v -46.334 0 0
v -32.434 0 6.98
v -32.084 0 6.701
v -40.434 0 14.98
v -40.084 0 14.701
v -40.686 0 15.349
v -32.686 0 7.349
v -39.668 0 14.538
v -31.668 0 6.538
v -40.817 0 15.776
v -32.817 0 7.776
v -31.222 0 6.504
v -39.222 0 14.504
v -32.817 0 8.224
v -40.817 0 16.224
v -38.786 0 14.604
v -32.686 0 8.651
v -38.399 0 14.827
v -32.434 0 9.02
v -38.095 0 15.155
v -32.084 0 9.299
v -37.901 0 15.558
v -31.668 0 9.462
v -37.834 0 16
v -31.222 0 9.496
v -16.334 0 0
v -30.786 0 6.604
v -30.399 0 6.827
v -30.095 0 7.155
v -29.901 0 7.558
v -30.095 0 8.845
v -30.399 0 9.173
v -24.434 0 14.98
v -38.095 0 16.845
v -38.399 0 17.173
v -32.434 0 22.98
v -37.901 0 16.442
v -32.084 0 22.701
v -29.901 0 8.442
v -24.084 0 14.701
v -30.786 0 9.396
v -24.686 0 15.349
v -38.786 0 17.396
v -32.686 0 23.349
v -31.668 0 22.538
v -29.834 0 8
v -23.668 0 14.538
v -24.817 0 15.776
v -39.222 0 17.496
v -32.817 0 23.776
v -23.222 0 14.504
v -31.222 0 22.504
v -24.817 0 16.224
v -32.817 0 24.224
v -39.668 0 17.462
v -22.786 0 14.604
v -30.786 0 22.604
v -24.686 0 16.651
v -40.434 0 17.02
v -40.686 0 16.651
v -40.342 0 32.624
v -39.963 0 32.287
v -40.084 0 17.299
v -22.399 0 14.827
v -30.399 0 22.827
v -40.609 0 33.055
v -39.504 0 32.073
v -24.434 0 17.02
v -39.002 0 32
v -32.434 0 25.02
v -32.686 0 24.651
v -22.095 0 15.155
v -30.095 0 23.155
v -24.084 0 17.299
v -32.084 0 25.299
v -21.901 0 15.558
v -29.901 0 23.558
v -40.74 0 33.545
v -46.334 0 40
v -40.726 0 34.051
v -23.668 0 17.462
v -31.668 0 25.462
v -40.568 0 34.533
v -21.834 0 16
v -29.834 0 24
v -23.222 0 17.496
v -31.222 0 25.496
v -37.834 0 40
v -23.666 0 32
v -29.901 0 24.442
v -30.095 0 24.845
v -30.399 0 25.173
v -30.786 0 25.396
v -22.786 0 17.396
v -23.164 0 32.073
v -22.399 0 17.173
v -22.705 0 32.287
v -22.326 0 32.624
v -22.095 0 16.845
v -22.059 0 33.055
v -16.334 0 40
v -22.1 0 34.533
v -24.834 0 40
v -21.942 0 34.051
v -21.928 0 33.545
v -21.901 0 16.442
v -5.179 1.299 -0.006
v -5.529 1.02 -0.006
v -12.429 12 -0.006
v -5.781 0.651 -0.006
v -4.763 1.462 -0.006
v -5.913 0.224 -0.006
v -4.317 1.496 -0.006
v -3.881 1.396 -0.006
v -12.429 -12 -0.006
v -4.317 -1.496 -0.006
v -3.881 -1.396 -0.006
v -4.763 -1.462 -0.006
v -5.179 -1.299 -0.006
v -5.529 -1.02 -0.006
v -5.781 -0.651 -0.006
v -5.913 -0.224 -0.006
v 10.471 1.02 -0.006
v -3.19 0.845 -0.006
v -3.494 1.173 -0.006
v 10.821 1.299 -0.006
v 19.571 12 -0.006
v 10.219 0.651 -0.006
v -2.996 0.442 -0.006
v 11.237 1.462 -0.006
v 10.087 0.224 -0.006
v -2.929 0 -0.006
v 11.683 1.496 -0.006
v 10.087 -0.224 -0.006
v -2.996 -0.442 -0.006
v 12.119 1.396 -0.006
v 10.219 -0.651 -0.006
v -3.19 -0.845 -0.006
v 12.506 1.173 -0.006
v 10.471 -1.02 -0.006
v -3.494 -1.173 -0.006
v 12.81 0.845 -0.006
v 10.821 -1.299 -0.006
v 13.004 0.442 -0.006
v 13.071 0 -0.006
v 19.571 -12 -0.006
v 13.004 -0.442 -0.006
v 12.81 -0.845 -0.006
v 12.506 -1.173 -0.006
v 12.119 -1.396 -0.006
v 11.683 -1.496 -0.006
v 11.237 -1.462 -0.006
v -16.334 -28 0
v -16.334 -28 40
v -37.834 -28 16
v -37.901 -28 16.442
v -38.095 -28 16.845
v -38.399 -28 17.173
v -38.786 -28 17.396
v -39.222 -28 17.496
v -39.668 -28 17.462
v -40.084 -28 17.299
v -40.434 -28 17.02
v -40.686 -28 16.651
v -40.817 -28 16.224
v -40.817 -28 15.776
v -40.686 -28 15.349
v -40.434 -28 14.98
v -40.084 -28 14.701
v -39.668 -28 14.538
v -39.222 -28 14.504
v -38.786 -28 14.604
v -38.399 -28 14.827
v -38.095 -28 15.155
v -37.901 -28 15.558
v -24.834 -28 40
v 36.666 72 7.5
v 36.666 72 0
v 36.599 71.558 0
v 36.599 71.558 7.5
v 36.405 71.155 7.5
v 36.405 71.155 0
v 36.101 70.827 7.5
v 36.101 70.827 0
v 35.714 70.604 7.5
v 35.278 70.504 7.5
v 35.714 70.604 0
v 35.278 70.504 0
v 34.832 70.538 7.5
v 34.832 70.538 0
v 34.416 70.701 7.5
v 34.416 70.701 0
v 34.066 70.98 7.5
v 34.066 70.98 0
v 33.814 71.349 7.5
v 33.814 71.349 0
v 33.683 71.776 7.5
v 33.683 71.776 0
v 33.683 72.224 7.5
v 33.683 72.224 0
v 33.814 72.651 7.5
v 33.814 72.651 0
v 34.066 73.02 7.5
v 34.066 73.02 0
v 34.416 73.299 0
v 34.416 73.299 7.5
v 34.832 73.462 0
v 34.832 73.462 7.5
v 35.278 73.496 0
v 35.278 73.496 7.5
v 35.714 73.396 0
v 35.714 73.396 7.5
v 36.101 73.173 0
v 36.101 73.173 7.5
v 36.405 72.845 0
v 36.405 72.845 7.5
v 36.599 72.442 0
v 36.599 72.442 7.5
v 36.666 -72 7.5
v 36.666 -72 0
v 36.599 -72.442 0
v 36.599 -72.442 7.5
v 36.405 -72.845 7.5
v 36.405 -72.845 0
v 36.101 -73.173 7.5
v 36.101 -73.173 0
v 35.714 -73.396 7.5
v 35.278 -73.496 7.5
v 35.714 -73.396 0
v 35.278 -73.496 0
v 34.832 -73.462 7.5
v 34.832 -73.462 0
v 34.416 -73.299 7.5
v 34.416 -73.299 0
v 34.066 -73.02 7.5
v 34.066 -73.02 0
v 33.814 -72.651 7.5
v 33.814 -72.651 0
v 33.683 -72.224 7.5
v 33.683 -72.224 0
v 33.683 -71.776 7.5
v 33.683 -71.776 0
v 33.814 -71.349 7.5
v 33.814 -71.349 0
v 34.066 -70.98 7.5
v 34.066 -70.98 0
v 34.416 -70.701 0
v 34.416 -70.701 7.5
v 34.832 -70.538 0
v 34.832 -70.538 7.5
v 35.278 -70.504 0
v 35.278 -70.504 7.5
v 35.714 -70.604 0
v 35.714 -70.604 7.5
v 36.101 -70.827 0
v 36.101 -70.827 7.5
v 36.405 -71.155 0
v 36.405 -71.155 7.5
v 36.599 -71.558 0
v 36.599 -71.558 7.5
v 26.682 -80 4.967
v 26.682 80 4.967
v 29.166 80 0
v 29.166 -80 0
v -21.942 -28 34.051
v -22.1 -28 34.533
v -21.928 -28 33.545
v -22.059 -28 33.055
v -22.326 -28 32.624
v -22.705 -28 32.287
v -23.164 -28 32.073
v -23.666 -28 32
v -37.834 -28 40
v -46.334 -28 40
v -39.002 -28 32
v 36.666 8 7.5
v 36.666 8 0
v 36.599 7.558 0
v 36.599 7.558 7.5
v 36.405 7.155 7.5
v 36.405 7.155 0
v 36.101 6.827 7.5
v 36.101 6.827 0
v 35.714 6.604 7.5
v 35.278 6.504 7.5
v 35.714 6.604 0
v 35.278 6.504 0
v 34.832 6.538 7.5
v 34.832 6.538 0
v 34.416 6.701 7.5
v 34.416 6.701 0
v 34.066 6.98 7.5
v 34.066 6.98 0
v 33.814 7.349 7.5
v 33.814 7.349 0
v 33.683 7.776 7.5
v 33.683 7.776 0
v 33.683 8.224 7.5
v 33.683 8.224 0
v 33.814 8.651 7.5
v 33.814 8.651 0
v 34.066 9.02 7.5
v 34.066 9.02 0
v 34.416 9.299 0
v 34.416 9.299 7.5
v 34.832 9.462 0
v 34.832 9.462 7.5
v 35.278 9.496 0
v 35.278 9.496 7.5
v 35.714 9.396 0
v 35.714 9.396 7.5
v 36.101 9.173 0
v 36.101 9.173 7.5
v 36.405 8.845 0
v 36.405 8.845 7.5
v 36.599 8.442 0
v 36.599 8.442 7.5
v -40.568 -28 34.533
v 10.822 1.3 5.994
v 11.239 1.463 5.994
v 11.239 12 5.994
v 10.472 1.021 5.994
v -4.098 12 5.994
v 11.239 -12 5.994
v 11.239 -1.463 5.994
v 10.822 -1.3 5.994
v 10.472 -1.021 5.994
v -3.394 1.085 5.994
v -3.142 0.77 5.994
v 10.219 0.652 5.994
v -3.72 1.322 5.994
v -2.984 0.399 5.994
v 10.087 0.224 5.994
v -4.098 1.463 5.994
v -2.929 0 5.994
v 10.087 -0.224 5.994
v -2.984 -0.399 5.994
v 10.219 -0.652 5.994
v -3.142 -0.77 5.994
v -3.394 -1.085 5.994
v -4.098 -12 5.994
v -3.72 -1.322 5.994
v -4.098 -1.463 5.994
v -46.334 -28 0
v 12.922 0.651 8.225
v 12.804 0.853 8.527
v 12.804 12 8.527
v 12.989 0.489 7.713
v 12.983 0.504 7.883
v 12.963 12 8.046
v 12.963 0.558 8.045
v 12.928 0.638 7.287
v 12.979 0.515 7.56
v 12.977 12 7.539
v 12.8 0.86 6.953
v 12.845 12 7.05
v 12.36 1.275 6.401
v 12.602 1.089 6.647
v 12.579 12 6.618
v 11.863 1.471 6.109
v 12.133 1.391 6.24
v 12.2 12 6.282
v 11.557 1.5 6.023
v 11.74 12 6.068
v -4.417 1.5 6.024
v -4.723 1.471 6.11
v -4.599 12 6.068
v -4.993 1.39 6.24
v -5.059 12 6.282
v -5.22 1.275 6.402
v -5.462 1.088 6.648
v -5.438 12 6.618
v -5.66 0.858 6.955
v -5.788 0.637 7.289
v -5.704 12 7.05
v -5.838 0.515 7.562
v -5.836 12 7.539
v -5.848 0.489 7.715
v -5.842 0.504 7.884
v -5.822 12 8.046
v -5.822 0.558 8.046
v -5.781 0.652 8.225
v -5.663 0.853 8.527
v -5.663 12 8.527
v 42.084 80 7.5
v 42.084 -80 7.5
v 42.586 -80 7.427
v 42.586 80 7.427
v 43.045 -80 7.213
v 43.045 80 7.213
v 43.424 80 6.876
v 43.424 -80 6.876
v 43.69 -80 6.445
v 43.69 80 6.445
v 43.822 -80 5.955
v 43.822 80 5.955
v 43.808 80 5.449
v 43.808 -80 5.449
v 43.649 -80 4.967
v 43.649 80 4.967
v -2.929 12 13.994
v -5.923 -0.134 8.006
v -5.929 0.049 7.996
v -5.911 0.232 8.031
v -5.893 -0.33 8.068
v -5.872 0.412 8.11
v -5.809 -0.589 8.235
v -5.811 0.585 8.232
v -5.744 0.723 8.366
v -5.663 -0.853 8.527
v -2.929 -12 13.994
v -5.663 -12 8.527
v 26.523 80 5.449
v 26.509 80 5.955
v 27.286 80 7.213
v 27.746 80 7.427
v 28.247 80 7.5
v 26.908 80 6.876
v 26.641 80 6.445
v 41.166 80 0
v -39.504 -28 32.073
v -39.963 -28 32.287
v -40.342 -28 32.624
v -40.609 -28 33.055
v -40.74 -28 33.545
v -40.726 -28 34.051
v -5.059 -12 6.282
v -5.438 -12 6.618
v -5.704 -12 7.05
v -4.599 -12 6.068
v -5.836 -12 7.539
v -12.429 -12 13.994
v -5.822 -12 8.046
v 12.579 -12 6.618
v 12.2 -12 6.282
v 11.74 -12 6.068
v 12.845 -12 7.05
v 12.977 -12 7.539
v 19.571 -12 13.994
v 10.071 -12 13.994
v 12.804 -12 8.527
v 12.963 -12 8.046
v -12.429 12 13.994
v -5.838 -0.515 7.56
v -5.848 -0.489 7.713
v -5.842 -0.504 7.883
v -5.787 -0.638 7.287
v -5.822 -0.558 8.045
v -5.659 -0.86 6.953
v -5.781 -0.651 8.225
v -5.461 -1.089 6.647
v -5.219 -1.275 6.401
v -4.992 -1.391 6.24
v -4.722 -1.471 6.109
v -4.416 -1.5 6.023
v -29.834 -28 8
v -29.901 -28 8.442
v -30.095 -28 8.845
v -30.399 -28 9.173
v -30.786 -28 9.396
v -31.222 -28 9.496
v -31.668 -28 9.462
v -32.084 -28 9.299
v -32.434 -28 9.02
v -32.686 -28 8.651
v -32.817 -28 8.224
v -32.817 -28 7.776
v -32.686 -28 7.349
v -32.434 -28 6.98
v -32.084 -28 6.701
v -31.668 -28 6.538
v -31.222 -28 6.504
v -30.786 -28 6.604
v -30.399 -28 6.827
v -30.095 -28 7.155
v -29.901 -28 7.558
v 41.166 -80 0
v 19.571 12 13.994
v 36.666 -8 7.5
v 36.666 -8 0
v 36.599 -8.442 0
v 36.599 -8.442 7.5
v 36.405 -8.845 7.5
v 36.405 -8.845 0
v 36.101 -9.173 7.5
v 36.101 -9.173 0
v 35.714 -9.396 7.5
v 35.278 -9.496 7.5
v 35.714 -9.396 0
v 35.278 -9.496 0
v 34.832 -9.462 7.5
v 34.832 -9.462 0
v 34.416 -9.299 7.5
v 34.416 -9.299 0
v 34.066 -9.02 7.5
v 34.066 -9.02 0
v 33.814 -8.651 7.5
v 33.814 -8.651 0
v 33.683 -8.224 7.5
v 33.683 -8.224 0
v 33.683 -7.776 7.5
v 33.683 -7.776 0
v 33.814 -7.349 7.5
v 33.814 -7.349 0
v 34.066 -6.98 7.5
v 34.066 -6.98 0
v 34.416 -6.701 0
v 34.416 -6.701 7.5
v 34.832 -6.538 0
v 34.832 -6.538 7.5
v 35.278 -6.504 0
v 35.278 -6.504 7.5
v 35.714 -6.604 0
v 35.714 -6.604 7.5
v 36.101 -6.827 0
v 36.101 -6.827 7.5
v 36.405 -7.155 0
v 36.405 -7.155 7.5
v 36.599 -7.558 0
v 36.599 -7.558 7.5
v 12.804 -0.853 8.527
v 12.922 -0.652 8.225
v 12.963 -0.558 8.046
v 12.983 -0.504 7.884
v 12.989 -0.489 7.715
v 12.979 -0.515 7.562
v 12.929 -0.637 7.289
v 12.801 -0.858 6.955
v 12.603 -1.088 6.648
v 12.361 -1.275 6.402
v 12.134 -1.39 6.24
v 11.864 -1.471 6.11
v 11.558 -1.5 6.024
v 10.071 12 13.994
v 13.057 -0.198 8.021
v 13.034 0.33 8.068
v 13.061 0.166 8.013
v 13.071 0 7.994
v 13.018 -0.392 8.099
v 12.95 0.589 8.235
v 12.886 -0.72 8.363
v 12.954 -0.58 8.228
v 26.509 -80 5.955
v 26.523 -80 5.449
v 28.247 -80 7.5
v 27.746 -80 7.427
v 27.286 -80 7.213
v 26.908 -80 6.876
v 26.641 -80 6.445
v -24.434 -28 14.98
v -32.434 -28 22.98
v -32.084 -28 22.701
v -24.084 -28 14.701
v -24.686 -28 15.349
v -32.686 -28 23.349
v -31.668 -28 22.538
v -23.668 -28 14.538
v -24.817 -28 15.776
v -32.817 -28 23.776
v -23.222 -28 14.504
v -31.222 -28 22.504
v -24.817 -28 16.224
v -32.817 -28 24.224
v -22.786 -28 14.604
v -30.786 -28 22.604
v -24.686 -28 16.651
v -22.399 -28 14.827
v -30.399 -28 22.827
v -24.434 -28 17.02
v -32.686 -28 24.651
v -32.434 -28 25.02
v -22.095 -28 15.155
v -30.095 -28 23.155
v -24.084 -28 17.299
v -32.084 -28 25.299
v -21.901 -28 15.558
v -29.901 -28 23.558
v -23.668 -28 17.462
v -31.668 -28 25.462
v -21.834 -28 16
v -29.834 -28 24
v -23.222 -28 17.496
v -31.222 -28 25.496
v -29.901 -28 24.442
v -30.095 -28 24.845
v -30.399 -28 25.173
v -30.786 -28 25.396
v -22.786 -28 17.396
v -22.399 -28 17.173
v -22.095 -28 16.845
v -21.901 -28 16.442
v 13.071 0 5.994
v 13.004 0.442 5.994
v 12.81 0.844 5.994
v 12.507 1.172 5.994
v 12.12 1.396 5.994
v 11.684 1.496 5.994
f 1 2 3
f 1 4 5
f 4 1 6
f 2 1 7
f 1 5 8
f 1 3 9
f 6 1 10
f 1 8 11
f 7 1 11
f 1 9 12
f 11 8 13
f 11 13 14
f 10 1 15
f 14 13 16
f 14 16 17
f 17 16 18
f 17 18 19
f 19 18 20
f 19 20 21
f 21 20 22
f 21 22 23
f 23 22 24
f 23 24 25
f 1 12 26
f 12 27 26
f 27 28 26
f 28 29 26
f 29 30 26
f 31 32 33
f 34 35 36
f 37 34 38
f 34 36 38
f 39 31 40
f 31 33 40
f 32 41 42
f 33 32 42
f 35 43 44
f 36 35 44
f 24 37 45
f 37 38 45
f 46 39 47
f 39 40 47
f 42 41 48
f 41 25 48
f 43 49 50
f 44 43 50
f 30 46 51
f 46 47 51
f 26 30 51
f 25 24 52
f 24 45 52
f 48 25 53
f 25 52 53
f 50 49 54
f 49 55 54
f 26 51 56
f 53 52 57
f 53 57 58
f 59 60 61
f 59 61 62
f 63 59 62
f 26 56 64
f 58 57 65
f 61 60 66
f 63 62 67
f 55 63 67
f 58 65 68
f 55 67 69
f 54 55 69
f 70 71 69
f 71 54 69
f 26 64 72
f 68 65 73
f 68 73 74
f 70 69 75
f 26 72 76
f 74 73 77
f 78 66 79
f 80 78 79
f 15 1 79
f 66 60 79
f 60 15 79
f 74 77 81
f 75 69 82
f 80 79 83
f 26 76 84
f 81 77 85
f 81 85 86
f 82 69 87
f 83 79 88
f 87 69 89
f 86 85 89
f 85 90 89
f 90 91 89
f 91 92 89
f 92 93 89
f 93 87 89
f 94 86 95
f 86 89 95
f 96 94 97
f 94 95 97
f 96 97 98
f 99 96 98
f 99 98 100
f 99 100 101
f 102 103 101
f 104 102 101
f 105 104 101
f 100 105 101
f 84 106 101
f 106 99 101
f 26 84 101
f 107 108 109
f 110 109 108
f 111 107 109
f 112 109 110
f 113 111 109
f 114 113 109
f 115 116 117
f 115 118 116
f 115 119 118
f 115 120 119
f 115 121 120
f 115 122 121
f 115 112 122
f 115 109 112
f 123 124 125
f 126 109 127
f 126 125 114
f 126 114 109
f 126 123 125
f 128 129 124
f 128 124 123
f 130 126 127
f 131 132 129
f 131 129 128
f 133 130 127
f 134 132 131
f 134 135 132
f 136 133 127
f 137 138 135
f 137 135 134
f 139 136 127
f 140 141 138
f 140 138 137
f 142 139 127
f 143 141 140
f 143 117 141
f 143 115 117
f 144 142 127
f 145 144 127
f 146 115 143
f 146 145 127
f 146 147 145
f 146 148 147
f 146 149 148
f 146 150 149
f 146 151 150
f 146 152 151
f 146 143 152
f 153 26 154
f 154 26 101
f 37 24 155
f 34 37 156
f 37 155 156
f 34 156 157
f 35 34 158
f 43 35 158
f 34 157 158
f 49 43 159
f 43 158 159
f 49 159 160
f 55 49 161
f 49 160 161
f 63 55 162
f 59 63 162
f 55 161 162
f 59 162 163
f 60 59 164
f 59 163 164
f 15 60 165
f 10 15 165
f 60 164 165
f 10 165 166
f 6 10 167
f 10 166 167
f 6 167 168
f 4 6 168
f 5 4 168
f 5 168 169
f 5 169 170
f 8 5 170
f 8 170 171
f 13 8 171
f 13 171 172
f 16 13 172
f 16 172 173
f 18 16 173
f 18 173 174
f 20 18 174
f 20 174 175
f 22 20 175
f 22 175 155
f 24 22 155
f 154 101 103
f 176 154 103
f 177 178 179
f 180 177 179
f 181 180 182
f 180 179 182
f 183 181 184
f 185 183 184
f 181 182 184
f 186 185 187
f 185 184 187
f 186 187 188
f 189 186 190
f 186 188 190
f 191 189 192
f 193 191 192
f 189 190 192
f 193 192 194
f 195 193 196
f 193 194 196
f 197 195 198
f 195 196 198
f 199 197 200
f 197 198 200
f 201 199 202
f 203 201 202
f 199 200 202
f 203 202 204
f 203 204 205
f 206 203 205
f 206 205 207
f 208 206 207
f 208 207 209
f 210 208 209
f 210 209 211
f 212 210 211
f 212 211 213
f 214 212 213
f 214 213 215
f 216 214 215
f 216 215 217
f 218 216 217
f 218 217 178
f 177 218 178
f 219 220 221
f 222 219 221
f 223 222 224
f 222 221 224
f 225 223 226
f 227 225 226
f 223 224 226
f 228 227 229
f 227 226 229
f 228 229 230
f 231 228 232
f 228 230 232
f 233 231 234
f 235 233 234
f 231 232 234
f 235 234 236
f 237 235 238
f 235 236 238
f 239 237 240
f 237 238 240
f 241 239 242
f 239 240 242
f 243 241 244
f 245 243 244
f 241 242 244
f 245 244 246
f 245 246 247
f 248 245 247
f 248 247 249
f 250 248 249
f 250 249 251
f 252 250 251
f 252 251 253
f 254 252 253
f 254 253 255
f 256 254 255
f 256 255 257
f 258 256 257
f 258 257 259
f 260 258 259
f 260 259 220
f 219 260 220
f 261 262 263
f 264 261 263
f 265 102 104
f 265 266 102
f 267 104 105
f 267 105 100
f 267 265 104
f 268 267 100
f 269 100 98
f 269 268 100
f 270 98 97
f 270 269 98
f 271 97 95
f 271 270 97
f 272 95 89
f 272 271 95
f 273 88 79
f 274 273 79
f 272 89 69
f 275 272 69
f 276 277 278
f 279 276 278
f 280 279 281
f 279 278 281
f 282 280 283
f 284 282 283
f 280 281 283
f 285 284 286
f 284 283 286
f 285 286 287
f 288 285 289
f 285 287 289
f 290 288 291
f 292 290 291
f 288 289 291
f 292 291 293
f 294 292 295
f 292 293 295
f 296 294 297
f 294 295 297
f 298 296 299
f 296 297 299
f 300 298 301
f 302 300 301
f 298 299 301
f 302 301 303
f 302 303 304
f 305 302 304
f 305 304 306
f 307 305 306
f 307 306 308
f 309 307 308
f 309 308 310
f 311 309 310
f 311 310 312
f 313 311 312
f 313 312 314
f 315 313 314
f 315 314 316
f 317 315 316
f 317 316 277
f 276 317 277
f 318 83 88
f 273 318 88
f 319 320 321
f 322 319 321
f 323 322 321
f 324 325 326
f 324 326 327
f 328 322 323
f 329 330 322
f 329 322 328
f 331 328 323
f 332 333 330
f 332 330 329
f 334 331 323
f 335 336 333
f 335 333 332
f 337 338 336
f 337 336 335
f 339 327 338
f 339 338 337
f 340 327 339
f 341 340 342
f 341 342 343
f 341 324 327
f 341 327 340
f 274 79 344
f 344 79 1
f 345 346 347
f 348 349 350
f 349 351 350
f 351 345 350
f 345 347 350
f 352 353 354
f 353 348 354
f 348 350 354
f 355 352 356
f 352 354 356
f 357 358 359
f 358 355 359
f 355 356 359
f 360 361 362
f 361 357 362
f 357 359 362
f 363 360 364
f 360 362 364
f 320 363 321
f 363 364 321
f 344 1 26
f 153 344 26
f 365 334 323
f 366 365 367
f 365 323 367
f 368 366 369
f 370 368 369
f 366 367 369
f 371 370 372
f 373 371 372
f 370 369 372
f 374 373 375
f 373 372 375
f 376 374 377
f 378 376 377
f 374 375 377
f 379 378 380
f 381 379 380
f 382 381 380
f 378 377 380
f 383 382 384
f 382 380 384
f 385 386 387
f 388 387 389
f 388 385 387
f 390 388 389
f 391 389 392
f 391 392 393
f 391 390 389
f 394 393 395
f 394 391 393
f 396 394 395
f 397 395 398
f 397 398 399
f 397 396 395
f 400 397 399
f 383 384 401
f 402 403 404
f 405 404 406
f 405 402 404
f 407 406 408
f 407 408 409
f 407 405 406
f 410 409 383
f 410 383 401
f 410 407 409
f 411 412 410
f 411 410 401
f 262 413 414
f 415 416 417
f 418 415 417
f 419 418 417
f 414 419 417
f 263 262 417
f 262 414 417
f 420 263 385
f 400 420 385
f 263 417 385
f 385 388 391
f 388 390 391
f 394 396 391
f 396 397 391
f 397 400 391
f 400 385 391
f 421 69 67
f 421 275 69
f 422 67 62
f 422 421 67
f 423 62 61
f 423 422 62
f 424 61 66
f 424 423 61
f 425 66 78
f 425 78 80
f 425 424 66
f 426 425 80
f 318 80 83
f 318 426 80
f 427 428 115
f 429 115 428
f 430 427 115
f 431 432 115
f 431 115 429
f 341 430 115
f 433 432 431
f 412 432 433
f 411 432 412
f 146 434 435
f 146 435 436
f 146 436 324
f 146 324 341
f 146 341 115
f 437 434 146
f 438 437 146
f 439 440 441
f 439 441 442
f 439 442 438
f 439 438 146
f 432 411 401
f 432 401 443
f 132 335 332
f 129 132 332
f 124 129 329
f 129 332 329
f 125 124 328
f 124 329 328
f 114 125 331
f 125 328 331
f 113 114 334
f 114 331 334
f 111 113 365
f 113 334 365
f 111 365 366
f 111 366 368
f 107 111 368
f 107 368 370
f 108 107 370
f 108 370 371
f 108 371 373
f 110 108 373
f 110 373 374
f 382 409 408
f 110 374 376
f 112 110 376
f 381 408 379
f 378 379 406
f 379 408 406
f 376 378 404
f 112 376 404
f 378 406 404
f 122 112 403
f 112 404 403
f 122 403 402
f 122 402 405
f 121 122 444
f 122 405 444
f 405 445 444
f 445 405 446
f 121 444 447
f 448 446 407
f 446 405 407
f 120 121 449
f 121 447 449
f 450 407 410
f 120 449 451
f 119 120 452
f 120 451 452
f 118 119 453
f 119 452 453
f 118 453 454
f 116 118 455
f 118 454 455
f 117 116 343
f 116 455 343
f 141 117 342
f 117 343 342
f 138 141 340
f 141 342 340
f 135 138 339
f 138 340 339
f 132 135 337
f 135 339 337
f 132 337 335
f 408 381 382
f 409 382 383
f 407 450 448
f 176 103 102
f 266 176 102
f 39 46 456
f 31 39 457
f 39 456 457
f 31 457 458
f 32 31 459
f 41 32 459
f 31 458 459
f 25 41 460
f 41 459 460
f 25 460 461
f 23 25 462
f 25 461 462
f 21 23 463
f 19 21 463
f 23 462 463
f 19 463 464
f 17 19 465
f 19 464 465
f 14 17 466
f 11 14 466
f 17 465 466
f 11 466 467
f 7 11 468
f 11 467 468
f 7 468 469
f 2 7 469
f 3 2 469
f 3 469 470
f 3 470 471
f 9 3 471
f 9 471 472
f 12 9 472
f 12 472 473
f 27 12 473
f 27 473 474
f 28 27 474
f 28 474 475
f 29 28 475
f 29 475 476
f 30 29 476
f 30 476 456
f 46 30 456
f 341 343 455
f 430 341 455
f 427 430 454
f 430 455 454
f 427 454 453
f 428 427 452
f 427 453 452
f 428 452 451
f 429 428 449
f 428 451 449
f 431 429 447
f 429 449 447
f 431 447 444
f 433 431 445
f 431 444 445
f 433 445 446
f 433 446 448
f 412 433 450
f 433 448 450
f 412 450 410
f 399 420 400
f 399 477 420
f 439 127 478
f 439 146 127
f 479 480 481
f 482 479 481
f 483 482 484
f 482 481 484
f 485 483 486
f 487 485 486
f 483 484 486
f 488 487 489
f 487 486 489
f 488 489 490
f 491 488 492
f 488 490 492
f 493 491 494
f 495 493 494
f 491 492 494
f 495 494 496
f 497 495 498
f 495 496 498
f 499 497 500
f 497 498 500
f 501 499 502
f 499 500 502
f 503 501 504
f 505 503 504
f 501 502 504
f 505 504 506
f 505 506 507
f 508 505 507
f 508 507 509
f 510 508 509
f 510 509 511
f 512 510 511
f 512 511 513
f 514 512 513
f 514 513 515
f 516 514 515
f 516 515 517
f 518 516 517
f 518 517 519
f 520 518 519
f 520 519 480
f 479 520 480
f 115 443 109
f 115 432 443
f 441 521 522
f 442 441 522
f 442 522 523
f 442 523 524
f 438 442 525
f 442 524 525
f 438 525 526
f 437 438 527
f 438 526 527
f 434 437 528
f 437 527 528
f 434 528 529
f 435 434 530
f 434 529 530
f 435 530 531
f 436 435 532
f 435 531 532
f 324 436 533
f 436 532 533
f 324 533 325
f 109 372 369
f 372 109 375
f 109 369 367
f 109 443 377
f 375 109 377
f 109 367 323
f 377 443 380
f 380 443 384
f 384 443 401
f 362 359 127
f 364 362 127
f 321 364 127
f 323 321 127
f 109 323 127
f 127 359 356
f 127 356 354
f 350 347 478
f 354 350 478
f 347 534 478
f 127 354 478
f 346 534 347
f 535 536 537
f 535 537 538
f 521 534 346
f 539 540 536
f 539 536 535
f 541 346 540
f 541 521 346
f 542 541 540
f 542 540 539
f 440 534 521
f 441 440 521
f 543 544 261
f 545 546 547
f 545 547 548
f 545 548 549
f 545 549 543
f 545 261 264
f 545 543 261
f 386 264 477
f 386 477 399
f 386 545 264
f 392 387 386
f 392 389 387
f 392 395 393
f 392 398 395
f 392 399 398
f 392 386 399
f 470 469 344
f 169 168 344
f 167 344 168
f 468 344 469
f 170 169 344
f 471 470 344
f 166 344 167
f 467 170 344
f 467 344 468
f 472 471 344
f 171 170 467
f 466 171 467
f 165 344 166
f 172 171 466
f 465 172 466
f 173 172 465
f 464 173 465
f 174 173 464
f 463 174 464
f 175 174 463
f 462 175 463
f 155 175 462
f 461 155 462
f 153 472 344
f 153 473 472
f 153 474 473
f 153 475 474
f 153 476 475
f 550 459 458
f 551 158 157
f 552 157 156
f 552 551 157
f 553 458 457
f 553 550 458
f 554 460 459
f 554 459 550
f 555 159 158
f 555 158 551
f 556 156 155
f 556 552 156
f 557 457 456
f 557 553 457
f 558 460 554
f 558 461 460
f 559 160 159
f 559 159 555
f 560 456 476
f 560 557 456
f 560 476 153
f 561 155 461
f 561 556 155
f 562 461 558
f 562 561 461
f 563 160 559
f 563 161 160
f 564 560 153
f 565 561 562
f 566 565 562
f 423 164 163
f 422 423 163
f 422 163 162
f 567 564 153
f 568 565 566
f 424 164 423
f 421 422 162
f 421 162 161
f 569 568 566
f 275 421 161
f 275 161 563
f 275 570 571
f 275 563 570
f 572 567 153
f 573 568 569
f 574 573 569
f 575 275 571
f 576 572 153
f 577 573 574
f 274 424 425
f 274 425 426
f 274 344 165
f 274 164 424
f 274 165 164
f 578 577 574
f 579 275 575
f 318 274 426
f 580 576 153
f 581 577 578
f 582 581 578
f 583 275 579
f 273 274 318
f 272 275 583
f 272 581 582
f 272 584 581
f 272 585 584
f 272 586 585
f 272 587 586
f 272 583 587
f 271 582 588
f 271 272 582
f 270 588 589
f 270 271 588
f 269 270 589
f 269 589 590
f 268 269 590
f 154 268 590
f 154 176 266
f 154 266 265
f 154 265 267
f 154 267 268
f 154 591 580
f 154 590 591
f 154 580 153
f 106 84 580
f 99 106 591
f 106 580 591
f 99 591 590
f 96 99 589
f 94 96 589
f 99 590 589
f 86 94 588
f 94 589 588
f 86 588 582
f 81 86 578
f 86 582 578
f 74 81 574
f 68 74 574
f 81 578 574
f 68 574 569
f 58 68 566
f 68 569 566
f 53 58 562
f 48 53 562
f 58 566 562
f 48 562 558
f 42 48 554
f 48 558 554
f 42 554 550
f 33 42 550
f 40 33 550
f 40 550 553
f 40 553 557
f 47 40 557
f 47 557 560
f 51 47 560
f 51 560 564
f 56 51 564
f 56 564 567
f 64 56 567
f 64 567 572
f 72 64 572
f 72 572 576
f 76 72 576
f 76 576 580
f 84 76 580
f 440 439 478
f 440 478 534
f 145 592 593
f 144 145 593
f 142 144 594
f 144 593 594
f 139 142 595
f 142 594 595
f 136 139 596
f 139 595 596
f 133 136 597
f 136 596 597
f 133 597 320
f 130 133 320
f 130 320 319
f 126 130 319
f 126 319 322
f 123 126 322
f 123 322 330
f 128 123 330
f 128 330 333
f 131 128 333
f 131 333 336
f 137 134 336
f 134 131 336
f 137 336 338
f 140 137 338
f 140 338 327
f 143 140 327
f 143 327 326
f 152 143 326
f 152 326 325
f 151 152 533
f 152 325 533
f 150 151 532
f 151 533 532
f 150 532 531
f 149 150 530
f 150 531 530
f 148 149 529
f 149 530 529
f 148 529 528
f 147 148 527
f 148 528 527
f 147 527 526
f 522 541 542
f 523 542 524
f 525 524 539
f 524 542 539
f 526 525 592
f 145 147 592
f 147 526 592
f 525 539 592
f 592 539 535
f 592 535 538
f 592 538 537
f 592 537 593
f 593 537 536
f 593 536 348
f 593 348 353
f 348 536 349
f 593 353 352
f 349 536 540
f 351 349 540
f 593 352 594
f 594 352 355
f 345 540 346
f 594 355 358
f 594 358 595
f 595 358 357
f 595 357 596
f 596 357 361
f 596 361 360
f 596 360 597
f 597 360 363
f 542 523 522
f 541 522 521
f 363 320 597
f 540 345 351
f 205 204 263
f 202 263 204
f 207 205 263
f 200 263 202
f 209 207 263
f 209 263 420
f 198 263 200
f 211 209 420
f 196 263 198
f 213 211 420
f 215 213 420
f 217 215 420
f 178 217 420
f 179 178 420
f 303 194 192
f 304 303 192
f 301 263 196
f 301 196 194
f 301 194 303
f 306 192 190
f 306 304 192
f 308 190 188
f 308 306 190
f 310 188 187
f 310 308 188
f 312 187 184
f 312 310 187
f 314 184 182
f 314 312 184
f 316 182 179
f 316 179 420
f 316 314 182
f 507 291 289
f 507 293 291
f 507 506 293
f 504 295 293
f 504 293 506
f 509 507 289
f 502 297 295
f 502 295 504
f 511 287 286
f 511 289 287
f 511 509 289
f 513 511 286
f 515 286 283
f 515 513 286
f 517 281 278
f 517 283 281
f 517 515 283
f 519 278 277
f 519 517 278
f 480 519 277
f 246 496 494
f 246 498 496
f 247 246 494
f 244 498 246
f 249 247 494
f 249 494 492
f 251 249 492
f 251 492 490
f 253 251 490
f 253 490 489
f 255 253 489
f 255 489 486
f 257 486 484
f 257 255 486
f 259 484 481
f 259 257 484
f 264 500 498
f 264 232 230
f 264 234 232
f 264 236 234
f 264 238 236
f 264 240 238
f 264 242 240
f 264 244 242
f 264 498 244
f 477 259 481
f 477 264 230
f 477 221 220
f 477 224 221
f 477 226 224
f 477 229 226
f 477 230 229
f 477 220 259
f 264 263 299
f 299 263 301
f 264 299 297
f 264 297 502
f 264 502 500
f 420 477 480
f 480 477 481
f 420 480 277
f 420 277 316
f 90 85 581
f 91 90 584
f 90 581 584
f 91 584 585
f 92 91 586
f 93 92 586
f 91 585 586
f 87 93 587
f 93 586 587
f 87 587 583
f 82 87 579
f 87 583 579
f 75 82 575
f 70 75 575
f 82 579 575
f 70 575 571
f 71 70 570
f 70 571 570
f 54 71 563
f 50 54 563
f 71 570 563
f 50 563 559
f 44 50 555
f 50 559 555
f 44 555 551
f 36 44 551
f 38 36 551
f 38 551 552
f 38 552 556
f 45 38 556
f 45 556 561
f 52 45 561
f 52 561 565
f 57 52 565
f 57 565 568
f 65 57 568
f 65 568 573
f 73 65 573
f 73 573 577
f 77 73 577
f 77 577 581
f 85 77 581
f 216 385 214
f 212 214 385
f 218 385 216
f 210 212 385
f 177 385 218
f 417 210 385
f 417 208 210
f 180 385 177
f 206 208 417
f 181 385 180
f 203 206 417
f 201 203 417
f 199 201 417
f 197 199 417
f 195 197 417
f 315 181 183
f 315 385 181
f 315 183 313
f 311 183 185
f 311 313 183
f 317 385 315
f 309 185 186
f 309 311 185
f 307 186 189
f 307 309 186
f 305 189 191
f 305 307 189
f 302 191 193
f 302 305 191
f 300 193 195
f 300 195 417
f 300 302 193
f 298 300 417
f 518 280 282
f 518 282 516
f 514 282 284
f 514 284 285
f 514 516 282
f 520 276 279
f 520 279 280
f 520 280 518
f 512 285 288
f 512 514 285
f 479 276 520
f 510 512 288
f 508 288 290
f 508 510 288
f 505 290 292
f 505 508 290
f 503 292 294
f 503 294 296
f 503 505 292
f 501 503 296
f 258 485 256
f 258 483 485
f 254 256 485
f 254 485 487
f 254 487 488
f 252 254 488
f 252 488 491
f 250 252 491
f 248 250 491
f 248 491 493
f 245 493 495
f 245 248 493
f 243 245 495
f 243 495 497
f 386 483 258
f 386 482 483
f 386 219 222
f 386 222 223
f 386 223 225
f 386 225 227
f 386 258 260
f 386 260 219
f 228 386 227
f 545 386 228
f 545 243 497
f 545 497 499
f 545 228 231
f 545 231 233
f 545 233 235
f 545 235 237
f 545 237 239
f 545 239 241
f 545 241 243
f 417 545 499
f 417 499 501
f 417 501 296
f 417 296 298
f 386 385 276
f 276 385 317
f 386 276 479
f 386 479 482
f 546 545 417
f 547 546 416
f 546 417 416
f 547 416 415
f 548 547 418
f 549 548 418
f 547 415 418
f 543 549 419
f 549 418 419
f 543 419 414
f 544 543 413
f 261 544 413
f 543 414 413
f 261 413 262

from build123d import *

# Parameters (mm, degrees)
F1_DEPTH      = 12
F3_DEPTH      = 80
F4_R          = 1.5
F5_DEPTH      = 7
F6_R          = 1.5
F7_DEPTH      = 13.9952990129
F9_DEPTH      = 28
F10_T4_DEPTH  = 24
F10_S5_R      = 1.5
F10_T6_DEPTH  = 14
F10_T10_DEPTH = 24
F10_S11_R     = 1.5
F10_T12_DEPTH = 14
F10_2_F1_R    = 1.75
F10_2_F2_R    = 1.75
F10_3_F1_R    = 1.75
F10_3_F2_R    = 1.75
F11_R         = 1.5
F12_DEPTH     = 108.001


# Not quite as in the source:
# - a fillet or chamfer that OpenCascade refuses, or shapes differently, is made with other operations: its cross-section is extruded or revolved along the edge and cut away or added


with BuildPart() as f1:
    # F0 (on Front) → F1 (new body, symmetric)
    with BuildSketch(Plane.XZ):
        Polygon((19.5705028659, -0.0057009871), (19.5705028659, 13.9942990129), (10.0705028659, 13.9942990129), (14.0705028659, 5.9942990129), (-6.9294971341, 5.9942990129), (-2.9294971341, 13.9942990129), (-12.4294971341, 13.9942990129), (-12.4294971341, -0.0057009871), align=None)
    extrude(amount=F1_DEPTH, both=True)

    # F4 (on face) → F5 (cut)
    with BuildSketch(Plane(origin=(0, 0, -0.0057009871), x_dir=(1, 0, 0), z_dir=(0, 0, -1))):
        with Locations((-4.4294971341, 0)):
            Circle(F4_R)
        with Locations((11.5705028659, 0)):
            Circle(F4_R)
    extrude(amount=-F5_DEPTH, mode=Mode.SUBTRACT)

    # F10: fillet of radius 1.75 on 2 edges, made by hand


with BuildPart() as f3:
    # F2 (on Front) → F3 (new body, symmetric)
    with BuildSketch(Plane.XZ):
        Polygon((25.415773809, 7.5), (29.165773809, 0), (41.165773809, 0), (44.915773809, 7.5), align=None)
    extrude(amount=F3_DEPTH, both=True)

    # F6 (on face) → F7 (cut, through all)
    with BuildSketch(Plane(origin=(0, 0, 0), x_dir=(1, 0, 0), z_dir=(0, 0, -1))):
        with Locations((35.165773809, 72)):
            Circle(F6_R)
        with Locations((35.165773809, -72)):
            Circle(F6_R)
        with Locations((35.165773809, 8)):
            Circle(F6_R)
        with Locations((35.165773809, -8)):
            Circle(F6_R)
    extrude(amount=-F7_DEPTH, mode=Mode.SUBTRACT)

    # F10#2: fillet of radius 1.75 on 2 edges, made by hand

    # F10_2_f1
    f10_2_f1_edges = [f3.edges().sort_by_distance(p)[0] for p in [
        (44.915773809, 0, 7.5),
    ]]
    fillet(f10_2_f1_edges, radius=F10_2_F1_R)

    # F10_2_f2
    f10_2_f2_edges = [f3.edges().sort_by_distance(p)[0] for p in [
        (25.415773809, 0, 7.5),
    ]]
    fillet(f10_2_f2_edges, radius=F10_2_F2_R)


with BuildPart() as f9:
    # F8 (on Front) → F9 (new body)
    with BuildSketch(Plane.XZ):
        Polygon((-46.3340594471, 40), (-46.3340594471, 0), (-16.3340594471, 0), (-16.3340594471, 40), (-24.8340594471, 40), (-20.8340594471, 32), (-41.8340594471, 32), (-37.8340594471, 40), align=None)
    extrude(amount=F9_DEPTH)

    # F10#3: fillet of radius 1.75 on 2 edges, made by hand

    # F10_3_f1
    f10_3_f1_edges = [f9.edges().sort_by_distance(p)[0] for p in [
        (-20.8340594471, -14, 32),
    ]]
    fillet(f10_3_f1_edges, radius=F10_3_F1_R)

    # F10_3_f2
    f10_3_f2_edges = [f9.edges().sort_by_distance(p)[0] for p in [
        (-41.8340594471, -14, 32),
    ]]
    fillet(f10_3_f2_edges, radius=F10_3_F2_R)

    # F11 (on face) → F12 (cut, through all)
    with BuildSketch(Plane.XZ.offset(28)):
        with Locations((-31.3340594471, 24)):
            Circle(F11_R)
        with Locations((-23.3340594471, 16)):
            Circle(F11_R)
        with Locations((-31.3340594471, 8)):
            Circle(F11_R)
        with Locations((-39.3340594471, 16)):
            Circle(F11_R)
    extrude(amount=-F12_DEPTH, mode=Mode.SUBTRACT)


with BuildPart() as f10_tool2:
    # F10_s3 → F10_t4 (new body)
    with BuildSketch(Plane.XZ.offset(-12)):
        with BuildLine():
            ThreePointArc((-4.0979376538, 5.9942990129), (-5.5865765684, 6.8242695667), (-5.663185238, 8.5269228051))
            Line((-5.663185238, 8.5269228051), (-6.9294971341, 5.9942990129))
            Line((-6.9294971341, 5.9942990129), (-4.0979376538, 5.9942990129))
        make_face()
    extrude(amount=F10_T4_DEPTH)

    # F10_s5 → F10_t6 (cut, symmetric)
    with BuildSketch(Plane.XY.offset(7.3)):
        with Locations((-4.4294971341, 0)):
            Circle(F10_S5_R)
    extrude(amount=F10_T6_DEPTH, both=True, mode=Mode.SUBTRACT)


with BuildPart() as f1_1:
    add(f1.part)

    # F10_t1: union F10_tool2
    add(f10_tool2.part)


with BuildPart() as f10_tool8:
    # F10_s9 → F10_t10 (new body)
    with BuildSketch(Plane.XZ.offset(-12)):
        with BuildLine():
            ThreePointArc((12.8041909699, 8.5269228051), (12.7275823002, 6.8242695667), (11.2389433856, 5.9942990129))
            Line((11.2389433856, 5.9942990129), (14.0705028659, 5.9942990129))
            Line((14.0705028659, 5.9942990129), (12.8041909699, 8.5269228051))
        make_face()
    extrude(amount=F10_T10_DEPTH)

    # F10_s11 → F10_t12 (cut, symmetric)
    with BuildSketch(Plane.XY.offset(7.3)):
        with Locations((11.5705028659, 0)):
            Circle(F10_S11_R)
    extrude(amount=F10_T12_DEPTH, both=True, mode=Mode.SUBTRACT)


with BuildPart() as f1_2:
    add(f1_1.part)

    # F10_t7: union F10_tool8
    add(f10_tool8.part)


solid = Compound([f3.part, f9.part, f1_2.part])
